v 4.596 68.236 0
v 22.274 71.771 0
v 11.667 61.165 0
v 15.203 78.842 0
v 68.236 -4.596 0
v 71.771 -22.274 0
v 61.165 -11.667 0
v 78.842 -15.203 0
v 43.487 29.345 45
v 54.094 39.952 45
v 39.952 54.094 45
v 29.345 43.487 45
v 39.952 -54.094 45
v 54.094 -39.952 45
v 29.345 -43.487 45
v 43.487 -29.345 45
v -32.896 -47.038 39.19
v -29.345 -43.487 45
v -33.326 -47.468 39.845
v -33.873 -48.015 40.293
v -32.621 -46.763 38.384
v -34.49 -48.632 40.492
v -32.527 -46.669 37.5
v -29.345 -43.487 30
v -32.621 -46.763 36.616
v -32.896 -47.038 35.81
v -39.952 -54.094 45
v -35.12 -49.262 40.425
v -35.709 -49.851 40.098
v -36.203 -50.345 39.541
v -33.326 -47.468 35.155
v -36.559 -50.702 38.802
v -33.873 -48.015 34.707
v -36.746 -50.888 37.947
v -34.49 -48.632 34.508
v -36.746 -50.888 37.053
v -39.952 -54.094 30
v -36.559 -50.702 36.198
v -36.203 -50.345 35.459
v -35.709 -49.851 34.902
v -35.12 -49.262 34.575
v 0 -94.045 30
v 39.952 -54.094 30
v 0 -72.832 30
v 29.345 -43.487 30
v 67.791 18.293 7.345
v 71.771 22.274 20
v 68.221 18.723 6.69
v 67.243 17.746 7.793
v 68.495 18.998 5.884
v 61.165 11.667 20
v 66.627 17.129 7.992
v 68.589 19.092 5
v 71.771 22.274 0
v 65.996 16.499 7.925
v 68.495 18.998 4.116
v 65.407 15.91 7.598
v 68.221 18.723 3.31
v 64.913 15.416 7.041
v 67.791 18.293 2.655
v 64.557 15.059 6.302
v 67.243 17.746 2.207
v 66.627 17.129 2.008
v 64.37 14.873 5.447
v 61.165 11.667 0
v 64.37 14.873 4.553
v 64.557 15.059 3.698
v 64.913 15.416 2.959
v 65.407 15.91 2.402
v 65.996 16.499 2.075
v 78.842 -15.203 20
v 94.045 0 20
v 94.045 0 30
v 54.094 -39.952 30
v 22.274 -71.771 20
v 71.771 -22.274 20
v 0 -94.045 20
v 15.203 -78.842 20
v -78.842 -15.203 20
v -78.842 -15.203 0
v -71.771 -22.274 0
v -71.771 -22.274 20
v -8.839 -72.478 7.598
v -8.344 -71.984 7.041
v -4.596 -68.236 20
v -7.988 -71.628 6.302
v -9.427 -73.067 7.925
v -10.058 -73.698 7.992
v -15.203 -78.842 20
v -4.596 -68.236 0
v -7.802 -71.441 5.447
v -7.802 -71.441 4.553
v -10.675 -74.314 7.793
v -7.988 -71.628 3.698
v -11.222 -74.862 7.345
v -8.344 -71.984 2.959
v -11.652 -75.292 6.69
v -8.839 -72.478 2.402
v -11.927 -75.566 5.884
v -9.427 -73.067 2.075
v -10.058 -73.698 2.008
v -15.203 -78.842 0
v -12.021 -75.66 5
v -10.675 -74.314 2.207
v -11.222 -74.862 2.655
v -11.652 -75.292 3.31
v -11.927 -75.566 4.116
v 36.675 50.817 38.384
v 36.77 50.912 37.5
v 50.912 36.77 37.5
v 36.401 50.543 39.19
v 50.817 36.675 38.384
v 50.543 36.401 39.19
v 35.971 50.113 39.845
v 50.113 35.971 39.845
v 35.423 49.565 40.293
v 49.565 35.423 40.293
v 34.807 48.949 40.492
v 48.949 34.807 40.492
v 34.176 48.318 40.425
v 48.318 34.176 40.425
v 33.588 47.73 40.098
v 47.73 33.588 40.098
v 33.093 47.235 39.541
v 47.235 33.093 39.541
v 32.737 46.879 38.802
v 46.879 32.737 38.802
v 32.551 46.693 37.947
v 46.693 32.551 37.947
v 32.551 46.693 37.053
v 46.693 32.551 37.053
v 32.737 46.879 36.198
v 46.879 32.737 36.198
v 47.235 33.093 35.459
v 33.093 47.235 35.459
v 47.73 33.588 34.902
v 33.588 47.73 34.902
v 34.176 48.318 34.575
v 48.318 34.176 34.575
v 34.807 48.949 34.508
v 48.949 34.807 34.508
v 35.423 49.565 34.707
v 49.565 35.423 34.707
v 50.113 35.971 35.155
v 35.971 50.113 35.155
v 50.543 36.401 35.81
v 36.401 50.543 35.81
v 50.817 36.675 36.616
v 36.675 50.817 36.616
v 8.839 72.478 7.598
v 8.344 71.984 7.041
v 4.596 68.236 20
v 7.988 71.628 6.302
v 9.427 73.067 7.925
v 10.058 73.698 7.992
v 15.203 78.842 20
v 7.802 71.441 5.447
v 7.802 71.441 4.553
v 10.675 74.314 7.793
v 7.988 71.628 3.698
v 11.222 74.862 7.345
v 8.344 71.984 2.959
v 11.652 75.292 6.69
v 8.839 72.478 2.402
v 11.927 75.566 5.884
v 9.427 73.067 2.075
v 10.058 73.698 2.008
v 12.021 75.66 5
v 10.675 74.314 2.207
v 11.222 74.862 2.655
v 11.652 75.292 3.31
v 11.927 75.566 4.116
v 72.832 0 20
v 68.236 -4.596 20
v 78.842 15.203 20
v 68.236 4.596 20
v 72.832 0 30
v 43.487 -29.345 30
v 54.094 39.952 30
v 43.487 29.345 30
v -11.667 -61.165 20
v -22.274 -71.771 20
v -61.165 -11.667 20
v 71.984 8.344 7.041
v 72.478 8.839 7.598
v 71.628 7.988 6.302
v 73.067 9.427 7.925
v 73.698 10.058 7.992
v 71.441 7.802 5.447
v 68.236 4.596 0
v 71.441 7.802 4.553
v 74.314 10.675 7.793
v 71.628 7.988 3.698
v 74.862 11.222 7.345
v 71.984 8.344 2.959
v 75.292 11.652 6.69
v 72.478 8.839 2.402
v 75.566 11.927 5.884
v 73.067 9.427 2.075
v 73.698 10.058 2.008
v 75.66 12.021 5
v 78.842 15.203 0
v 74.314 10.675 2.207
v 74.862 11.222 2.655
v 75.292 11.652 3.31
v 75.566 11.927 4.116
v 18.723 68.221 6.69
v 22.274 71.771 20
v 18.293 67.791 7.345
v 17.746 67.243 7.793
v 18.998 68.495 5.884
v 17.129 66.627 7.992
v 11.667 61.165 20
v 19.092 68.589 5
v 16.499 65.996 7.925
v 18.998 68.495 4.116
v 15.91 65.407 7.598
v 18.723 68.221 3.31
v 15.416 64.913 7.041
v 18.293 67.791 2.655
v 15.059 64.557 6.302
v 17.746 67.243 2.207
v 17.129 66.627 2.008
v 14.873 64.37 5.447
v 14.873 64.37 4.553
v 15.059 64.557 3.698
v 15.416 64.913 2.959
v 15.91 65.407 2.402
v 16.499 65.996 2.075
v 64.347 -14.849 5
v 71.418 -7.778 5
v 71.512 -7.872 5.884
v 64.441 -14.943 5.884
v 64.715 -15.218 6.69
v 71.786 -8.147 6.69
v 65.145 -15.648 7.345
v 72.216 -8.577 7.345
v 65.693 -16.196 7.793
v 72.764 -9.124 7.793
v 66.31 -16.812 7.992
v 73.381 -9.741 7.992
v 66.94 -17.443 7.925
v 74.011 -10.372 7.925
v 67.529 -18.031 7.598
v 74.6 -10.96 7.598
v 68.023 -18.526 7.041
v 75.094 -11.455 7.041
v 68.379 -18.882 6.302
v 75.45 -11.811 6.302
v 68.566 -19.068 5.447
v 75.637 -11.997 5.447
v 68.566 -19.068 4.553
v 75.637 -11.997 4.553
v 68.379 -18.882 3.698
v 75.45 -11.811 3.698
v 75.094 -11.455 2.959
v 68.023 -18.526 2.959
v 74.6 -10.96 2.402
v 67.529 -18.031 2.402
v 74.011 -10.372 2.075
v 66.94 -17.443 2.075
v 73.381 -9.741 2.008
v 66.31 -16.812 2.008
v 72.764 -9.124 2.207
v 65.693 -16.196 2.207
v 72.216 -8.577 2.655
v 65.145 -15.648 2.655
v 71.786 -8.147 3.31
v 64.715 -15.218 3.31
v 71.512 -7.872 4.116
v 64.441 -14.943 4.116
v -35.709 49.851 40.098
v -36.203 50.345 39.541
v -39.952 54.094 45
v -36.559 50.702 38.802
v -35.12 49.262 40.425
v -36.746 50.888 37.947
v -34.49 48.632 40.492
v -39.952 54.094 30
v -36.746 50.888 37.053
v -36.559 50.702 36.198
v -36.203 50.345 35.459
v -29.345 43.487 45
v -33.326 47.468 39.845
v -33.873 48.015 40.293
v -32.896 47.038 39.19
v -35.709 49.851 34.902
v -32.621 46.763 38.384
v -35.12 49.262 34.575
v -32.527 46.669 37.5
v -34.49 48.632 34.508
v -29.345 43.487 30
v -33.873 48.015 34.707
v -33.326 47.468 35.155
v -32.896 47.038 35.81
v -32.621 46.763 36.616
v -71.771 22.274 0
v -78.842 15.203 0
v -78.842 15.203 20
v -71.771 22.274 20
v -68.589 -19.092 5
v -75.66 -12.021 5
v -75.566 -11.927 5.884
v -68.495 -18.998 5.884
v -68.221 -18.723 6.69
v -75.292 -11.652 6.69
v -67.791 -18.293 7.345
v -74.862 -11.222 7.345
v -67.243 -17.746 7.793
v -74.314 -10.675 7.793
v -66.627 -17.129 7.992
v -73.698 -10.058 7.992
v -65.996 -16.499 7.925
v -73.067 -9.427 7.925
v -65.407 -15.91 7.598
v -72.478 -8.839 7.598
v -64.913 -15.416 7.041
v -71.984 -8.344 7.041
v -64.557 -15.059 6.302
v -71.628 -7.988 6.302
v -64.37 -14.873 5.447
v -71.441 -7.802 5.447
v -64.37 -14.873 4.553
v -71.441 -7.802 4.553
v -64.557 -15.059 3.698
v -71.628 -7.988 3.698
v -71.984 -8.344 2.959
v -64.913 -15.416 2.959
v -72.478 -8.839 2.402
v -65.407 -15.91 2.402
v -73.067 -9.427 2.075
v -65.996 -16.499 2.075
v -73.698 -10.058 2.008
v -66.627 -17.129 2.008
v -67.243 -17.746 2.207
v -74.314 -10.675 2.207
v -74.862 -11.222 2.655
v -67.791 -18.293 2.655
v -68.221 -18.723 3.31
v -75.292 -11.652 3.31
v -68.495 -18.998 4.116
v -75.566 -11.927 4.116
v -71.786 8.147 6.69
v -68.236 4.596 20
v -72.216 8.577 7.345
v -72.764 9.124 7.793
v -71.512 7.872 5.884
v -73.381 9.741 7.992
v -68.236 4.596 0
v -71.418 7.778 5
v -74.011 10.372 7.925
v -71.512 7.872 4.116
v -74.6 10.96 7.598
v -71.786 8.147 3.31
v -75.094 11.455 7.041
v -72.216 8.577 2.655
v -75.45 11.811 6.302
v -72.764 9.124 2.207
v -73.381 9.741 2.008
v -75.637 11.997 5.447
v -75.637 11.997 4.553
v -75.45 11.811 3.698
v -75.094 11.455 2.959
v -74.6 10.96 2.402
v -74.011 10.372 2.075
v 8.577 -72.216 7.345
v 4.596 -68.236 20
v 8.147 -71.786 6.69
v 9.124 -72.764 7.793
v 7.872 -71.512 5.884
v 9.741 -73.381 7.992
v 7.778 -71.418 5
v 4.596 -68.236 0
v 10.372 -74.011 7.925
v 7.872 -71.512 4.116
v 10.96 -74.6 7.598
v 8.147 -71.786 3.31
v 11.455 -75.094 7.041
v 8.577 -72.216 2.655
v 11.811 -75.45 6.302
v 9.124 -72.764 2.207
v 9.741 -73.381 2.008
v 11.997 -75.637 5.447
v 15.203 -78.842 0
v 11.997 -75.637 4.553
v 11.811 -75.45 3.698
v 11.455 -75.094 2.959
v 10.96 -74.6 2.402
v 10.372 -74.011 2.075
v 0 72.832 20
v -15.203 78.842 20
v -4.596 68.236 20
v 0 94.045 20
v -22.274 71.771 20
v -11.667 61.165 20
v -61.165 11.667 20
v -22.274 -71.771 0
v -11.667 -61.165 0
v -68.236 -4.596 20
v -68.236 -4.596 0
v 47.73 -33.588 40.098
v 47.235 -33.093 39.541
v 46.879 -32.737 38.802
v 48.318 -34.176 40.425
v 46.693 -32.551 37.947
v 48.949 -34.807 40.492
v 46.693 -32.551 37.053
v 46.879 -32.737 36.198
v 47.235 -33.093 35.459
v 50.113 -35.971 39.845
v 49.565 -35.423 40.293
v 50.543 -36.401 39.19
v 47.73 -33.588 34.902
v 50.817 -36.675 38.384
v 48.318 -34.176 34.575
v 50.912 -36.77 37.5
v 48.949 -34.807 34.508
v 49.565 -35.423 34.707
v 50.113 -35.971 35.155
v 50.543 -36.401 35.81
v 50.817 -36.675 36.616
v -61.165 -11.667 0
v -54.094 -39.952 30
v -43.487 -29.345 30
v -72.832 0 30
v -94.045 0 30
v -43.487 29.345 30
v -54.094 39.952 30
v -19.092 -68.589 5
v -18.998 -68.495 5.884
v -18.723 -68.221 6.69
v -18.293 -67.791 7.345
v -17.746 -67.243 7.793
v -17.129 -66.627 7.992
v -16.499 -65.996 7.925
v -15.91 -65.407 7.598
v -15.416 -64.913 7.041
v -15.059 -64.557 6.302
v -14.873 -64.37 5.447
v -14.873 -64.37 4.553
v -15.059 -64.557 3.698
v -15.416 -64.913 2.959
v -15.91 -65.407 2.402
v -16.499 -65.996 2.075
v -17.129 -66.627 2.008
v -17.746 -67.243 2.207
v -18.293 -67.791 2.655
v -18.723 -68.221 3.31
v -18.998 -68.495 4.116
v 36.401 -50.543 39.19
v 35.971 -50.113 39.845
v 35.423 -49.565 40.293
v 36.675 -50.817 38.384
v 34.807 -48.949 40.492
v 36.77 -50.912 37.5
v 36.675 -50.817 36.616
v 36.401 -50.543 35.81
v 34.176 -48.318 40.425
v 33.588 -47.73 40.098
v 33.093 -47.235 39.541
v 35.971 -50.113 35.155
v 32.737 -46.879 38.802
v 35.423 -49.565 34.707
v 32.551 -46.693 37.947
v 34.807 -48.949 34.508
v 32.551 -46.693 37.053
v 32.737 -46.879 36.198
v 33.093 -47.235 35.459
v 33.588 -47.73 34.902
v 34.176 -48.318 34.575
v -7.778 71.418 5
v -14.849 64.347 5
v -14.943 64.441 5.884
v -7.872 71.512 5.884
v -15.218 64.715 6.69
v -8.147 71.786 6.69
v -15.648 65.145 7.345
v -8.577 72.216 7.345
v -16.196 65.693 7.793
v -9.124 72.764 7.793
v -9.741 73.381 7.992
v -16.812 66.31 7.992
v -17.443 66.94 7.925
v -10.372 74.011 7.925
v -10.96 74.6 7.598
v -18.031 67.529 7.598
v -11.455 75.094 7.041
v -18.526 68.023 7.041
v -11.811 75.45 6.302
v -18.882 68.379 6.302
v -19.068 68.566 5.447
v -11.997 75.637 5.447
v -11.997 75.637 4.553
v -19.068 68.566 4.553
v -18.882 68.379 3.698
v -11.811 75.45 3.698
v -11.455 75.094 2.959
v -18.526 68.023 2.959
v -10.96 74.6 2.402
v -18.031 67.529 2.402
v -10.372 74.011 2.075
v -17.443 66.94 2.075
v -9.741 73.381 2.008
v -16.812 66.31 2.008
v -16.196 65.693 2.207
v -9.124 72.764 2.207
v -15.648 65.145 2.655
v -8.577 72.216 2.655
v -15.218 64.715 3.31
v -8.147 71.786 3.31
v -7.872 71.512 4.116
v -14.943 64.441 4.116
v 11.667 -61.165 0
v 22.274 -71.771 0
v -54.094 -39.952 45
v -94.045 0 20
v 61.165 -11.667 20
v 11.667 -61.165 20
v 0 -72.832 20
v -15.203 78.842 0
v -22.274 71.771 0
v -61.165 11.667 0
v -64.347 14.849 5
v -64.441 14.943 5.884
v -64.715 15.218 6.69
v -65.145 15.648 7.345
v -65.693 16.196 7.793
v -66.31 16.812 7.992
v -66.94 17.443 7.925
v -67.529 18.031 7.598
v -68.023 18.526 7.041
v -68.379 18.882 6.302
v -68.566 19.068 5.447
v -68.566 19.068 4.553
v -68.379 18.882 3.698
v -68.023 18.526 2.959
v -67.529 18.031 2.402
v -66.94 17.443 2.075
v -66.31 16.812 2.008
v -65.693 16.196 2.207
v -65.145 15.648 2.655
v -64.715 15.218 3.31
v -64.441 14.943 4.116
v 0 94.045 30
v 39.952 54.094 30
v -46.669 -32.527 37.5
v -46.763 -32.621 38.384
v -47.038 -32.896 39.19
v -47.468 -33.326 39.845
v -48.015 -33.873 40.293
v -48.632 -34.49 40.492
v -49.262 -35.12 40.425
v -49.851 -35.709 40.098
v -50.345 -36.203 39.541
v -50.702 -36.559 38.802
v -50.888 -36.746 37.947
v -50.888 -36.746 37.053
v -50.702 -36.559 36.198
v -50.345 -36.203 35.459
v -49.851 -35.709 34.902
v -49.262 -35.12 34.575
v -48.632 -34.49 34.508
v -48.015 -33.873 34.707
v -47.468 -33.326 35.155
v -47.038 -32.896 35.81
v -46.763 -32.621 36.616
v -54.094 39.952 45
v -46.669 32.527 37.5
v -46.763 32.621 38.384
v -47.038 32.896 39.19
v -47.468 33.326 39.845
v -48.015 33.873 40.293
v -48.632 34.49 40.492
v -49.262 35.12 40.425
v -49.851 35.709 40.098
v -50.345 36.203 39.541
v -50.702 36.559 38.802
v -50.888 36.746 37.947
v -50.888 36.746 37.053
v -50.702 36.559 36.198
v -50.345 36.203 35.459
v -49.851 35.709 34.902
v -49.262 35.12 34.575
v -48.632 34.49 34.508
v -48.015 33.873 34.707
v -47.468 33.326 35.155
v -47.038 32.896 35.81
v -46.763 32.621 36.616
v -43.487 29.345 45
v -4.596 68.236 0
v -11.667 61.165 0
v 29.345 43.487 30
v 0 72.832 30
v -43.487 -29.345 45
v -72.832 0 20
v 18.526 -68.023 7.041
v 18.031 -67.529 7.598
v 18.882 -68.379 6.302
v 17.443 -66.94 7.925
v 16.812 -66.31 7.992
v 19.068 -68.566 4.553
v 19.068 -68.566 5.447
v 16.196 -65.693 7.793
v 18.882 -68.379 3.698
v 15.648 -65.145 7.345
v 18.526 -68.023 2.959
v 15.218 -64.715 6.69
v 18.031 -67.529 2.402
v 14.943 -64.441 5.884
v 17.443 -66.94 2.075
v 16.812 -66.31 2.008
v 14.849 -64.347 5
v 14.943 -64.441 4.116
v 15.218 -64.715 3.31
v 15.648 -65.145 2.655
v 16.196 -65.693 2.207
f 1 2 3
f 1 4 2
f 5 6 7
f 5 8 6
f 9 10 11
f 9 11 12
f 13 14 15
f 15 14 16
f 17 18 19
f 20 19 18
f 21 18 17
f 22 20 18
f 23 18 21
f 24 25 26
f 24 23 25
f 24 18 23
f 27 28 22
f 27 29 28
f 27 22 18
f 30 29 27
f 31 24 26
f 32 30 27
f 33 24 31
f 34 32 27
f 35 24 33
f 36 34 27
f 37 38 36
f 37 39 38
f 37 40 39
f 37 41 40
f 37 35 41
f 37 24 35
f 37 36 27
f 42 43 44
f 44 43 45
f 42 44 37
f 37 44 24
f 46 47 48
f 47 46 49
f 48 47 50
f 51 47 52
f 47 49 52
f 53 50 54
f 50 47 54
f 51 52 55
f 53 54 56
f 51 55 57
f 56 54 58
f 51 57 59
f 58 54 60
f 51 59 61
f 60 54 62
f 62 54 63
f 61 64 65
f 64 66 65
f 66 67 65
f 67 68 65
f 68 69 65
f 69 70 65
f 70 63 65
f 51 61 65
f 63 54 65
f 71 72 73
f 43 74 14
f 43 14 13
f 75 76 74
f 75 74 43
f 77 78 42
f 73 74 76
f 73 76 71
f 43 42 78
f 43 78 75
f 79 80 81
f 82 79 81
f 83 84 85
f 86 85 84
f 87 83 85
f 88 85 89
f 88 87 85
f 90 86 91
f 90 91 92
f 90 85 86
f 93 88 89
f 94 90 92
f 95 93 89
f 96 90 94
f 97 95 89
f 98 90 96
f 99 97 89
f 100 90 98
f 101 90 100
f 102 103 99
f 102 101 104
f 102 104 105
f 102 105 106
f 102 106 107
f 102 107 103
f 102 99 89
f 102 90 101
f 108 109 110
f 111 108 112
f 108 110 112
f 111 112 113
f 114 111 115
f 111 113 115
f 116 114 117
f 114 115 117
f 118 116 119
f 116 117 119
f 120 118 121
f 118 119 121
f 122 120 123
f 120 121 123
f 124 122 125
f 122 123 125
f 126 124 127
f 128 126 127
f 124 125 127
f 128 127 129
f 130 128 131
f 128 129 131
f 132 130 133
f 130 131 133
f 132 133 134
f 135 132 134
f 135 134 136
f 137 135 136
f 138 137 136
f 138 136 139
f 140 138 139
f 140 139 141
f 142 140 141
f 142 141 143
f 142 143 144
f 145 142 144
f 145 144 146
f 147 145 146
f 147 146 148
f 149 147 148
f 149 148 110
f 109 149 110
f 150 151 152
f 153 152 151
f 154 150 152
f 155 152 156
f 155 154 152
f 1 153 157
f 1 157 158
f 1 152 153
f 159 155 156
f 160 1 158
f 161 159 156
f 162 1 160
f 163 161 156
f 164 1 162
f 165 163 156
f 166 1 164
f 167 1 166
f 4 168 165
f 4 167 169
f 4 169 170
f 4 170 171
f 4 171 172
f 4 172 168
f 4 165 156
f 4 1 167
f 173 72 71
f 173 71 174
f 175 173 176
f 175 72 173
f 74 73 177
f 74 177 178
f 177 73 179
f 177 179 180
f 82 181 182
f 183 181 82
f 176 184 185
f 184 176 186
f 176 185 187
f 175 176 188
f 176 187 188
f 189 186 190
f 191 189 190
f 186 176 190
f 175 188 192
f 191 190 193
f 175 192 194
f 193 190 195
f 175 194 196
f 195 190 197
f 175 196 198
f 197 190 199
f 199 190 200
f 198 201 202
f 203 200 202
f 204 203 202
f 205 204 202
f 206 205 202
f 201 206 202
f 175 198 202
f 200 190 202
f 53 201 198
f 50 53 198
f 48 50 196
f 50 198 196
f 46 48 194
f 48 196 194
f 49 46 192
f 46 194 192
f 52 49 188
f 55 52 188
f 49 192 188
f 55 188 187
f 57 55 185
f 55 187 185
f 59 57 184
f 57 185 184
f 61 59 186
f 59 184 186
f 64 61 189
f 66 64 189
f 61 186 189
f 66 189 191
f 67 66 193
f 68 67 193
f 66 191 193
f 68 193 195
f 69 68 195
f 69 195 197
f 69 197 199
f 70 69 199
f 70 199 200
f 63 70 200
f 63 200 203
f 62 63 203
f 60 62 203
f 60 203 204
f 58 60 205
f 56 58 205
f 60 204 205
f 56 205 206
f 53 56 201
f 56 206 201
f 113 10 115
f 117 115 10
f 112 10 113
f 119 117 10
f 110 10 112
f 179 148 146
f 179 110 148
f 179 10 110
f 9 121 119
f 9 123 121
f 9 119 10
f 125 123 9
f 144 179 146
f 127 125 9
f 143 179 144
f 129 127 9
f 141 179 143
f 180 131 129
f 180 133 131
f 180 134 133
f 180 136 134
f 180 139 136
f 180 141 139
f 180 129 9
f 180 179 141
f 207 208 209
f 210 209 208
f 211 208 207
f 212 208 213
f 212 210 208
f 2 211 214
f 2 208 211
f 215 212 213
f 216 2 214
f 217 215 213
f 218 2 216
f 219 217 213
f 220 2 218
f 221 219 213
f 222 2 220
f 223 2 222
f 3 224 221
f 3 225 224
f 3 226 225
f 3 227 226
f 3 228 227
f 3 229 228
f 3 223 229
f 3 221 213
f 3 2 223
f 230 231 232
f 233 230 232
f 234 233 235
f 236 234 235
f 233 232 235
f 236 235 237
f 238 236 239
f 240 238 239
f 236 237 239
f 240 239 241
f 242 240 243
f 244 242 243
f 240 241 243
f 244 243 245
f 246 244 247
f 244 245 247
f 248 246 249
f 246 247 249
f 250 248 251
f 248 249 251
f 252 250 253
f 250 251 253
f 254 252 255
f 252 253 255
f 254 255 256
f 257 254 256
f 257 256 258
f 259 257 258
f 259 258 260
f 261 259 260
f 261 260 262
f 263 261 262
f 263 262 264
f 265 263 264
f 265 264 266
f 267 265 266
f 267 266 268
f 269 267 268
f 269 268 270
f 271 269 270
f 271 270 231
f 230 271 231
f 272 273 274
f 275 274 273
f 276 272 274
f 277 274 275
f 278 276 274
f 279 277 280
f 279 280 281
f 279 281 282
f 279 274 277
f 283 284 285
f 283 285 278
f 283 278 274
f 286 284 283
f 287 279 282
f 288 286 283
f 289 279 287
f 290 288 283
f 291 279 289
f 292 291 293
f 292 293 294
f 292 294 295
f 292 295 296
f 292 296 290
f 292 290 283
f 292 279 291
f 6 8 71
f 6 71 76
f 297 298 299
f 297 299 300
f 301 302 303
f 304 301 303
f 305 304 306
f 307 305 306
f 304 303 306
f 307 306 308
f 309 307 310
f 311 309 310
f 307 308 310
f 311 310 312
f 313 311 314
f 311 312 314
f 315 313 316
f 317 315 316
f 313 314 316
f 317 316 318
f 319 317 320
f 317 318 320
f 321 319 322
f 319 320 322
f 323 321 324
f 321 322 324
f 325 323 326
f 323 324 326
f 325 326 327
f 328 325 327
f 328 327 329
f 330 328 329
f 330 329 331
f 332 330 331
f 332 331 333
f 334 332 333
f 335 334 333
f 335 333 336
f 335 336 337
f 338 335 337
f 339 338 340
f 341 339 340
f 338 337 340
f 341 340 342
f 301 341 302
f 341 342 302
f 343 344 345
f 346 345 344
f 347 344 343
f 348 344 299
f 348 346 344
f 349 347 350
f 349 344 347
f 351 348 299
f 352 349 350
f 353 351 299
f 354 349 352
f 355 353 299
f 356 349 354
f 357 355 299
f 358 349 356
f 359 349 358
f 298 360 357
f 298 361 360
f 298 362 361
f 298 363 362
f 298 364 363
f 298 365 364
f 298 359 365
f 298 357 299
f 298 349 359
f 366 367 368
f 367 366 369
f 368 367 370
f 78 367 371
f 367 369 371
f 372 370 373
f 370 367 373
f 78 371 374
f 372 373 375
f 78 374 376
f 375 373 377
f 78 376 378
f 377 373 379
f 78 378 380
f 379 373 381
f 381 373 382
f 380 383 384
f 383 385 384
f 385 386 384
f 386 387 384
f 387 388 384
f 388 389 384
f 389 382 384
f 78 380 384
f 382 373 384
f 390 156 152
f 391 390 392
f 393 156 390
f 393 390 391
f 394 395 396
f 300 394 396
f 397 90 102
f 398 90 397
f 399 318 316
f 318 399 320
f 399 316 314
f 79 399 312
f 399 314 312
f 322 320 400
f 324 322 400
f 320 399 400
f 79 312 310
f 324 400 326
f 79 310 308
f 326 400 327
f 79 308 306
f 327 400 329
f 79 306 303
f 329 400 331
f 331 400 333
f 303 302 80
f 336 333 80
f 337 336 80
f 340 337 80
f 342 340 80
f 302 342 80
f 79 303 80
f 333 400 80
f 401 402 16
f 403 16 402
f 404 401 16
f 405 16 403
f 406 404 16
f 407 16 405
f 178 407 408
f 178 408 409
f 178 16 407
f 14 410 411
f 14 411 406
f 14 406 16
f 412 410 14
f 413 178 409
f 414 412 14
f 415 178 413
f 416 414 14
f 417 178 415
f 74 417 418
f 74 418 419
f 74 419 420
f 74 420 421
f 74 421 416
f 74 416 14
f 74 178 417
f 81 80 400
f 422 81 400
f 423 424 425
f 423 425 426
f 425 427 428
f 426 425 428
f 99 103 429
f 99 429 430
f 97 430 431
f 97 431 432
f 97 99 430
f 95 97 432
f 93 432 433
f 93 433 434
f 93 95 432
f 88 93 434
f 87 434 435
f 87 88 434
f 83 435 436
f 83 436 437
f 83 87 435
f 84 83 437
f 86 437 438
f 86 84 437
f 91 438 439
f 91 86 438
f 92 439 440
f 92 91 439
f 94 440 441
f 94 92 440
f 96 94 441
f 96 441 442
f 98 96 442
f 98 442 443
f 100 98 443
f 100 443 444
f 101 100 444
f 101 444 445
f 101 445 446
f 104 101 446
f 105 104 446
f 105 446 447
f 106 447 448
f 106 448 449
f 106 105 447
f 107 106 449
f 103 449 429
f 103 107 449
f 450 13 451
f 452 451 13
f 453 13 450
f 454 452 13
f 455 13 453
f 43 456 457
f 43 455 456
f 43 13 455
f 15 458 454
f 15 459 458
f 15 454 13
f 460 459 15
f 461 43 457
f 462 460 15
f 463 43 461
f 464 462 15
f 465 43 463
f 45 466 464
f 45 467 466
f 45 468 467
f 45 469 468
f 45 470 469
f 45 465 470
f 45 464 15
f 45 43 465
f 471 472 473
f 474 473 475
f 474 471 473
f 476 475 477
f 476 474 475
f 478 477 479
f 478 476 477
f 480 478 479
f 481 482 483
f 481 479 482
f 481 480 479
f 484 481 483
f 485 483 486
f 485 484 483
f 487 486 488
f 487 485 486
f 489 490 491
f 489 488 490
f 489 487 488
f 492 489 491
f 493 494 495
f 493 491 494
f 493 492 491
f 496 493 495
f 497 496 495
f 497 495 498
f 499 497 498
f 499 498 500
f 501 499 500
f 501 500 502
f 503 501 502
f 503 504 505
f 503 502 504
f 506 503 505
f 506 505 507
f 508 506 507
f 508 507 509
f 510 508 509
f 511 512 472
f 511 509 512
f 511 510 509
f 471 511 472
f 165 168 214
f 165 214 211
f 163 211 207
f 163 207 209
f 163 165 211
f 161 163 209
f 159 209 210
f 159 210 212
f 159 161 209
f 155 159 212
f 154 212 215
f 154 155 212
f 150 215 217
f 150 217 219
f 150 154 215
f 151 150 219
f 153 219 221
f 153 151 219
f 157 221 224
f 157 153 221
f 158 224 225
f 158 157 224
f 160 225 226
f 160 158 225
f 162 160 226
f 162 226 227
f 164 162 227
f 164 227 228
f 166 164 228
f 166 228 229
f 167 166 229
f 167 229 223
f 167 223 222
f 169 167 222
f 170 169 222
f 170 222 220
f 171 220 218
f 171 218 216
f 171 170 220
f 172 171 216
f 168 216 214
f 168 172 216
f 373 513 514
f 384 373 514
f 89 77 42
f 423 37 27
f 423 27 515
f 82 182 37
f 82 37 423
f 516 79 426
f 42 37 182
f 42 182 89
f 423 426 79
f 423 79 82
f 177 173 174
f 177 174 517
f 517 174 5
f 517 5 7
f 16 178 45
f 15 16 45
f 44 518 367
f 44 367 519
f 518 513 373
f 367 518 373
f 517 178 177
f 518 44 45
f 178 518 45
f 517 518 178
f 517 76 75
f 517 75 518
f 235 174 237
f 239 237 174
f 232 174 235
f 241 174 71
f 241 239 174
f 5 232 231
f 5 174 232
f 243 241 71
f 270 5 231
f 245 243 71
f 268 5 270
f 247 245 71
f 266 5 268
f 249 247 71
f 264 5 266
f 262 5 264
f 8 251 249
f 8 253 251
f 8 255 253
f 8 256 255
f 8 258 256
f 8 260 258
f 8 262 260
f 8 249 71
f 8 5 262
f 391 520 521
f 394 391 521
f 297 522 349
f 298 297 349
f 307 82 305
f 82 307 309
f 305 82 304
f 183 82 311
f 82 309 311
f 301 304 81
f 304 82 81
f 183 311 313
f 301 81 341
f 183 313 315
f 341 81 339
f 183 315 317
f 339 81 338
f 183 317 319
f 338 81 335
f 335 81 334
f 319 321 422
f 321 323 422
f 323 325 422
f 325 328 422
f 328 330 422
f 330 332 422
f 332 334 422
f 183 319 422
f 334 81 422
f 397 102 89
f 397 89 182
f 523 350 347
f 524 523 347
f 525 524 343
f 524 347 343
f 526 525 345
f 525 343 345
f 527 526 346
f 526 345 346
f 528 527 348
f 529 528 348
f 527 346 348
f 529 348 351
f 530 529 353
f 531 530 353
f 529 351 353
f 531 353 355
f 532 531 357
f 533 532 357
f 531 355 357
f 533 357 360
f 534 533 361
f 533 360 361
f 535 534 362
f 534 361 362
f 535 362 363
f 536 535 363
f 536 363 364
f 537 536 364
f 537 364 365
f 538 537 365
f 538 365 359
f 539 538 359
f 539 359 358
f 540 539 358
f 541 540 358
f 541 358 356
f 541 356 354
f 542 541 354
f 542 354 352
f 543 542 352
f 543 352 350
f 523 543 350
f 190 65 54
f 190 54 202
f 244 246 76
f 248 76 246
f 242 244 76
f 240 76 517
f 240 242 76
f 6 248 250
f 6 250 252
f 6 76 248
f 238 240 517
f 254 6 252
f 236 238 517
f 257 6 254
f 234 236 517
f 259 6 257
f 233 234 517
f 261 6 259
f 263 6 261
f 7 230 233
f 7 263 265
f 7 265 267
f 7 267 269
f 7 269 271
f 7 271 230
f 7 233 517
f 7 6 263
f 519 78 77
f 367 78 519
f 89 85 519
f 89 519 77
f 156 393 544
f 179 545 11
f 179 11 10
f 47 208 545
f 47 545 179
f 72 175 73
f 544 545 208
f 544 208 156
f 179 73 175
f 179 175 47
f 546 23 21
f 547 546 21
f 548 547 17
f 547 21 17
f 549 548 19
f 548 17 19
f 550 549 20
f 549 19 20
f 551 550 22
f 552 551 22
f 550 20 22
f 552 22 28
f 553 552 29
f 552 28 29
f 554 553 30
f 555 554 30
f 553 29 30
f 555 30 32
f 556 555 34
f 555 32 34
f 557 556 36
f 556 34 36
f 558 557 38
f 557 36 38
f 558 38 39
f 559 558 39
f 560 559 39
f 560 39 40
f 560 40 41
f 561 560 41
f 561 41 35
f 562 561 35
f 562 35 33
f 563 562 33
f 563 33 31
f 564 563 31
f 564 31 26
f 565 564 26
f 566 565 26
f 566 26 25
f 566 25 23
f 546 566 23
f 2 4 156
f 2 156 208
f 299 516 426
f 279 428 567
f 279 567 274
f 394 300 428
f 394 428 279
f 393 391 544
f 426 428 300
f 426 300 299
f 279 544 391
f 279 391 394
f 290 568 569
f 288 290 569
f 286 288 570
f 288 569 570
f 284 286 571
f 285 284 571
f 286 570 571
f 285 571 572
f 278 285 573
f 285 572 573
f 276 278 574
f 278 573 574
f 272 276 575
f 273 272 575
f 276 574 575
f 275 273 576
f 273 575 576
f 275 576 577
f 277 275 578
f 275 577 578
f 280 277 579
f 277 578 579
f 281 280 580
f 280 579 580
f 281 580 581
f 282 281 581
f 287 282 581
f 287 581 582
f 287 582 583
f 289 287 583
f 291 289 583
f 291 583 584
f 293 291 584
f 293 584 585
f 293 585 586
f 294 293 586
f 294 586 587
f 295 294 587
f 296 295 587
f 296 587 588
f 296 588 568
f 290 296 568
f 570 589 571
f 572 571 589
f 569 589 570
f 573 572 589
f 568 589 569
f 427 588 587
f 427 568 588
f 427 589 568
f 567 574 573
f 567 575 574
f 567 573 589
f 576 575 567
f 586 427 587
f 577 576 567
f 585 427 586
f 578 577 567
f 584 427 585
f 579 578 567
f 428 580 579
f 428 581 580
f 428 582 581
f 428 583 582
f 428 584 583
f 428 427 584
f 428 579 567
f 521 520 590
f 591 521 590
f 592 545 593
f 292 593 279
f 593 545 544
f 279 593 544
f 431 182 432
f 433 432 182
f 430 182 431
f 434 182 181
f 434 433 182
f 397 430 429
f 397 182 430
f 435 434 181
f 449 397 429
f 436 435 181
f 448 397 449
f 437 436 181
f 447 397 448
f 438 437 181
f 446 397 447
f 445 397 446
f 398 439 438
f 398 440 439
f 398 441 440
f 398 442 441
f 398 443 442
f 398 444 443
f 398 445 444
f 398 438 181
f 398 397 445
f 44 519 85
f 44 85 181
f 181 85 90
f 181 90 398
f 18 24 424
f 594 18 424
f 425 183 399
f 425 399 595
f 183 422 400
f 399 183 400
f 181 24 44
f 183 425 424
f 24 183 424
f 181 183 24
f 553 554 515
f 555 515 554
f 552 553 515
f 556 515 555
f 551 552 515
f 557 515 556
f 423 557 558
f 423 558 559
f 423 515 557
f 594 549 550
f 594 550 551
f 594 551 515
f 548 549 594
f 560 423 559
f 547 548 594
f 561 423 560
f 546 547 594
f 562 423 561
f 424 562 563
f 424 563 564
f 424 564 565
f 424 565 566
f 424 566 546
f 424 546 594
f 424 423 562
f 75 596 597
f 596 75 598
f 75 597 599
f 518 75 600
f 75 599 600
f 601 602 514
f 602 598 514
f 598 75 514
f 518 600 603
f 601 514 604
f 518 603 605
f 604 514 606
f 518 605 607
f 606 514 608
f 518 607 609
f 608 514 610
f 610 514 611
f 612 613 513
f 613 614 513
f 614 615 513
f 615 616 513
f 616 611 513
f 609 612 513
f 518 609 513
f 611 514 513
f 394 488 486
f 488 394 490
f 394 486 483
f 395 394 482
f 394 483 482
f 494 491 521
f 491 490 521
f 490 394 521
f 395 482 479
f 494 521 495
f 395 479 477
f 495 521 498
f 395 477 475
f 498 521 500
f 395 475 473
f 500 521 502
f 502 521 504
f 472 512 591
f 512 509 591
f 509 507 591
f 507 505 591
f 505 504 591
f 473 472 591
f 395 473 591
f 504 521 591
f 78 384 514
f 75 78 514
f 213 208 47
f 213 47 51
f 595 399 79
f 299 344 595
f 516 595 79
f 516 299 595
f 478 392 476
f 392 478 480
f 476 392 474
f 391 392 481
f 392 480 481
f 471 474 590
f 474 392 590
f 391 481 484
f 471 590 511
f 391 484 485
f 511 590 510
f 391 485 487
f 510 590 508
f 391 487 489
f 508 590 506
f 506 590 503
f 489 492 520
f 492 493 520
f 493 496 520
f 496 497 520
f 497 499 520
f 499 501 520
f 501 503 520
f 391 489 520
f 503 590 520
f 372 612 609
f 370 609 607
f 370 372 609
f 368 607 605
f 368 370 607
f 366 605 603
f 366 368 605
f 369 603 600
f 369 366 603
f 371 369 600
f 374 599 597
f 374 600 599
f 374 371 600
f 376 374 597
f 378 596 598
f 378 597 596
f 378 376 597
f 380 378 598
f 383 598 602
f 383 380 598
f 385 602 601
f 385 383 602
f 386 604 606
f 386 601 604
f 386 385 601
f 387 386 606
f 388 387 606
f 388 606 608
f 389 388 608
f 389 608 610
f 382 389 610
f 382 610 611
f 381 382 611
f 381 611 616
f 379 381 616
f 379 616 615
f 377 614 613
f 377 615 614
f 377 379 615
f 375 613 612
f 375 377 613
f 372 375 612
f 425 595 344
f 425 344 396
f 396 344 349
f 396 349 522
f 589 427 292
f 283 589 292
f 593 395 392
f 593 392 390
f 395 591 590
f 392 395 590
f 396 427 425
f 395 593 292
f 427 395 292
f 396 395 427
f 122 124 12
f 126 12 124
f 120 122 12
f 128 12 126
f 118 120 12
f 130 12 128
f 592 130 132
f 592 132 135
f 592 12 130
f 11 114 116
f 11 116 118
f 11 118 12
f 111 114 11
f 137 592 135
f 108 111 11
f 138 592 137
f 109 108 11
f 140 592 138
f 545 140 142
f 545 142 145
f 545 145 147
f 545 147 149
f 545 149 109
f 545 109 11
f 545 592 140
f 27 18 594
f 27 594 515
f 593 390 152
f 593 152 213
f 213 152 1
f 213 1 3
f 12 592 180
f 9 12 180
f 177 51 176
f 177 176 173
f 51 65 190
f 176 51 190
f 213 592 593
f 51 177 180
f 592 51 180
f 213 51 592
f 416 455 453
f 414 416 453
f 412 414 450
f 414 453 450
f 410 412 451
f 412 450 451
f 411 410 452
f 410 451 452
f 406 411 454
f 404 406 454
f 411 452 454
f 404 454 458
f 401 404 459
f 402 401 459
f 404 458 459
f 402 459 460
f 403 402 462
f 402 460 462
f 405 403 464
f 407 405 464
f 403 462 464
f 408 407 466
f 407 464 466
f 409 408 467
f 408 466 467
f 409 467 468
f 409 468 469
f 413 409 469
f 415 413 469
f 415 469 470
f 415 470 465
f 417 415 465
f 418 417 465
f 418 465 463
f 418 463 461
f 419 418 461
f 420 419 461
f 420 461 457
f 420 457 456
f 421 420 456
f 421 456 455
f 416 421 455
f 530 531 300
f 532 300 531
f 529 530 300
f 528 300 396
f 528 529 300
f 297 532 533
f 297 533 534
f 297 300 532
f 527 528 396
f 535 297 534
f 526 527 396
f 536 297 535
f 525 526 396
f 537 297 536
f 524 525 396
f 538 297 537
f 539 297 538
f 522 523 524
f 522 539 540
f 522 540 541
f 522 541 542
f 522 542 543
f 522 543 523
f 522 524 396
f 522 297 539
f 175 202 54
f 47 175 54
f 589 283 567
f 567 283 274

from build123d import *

# Parameters (mm, degrees)
SALIENTE_EXTRUIR1_DEPTH   = 20
SALIENTE_EXTRUIR1_2_DEPTH = 20
SALIENTE_EXTRUIR1_3_DEPTH = 20
SALIENTE_EXTRUIR1_4_DEPTH = 20
SALIENTE_EXTRUIR1_5_DEPTH = 20
SALIENTE_EXTRUIR1_6_DEPTH = 20
SALIENTE_EXTRUIR1_7_DEPTH = 20
SALIENTE_EXTRUIR1_8_DEPTH = 20
SALIENTE_EXTRUIR2_DEPTH   = 10
CROQUIS7_R                = 3
CORTAR_EXTRUIR2_DEPTH     = 80
CROQUIS8_R                = 3
CORTAR_EXTRUIR3_DEPTH     = 10
SIMETR_A4_COPY_1_SKETCH_R = 3
SIMETR_A4_COPY_1_DEPTH    = 80
SIMETR_A4_COPY_2_SKETCH_R = 3
SIMETR_A4_COPY_2_DEPTH    = 10
SALIENTE_EXTRUIR3_DEPTH   = 15
CROQUIS11_R               = 3
CORTAR_EXTRUIR4_DEPTH     = 150.913308282
CROQUIS13_R               = 3
CORTAR_EXTRUIR5_DEPTH     = 150.913308282


with BuildPart() as part:
    # Croquis1 → Saliente-Extruir1 (new body)
    with BuildSketch(Plane.XY):
        Polygon((-71.77133829, 22.273863607), (-61.164736573, 11.66726189), (-68.235804385, 4.596194078), (-78.842406102, 15.202795796), align=None)
    extrude(amount=SALIENTE_EXTRUIR1_DEPTH)



with BuildPart() as body_2:
    # Croquis1 → Saliente-Extruir1 2 (new body)
    with BuildSketch(Plane.XY):
        Polygon((-11.66726189, 61.164736573), (-4.596194078, 68.235804385), (-15.202795796, 78.842406102), (-22.273863607, 71.77133829), align=None)
    extrude(amount=SALIENTE_EXTRUIR1_2_DEPTH)


with BuildPart() as body_3:
    # Croquis1 → Saliente-Extruir1 3 (new body)
    with BuildSketch(Plane.XY):
        Polygon((22.273863607, 71.77133829), (11.66726189, 61.164736573), (4.596194078, 68.235804385), (15.202795796, 78.842406102), align=None)
    extrude(amount=SALIENTE_EXTRUIR1_3_DEPTH)


with BuildPart() as body_4:
    # Croquis1 → Saliente-Extruir1 4 (new body)
    with BuildSketch(Plane.XY):
        Polygon((61.164736573, 11.66726189), (68.235804385, 4.596194078), (78.842406102, 15.202795796), (71.77133829, 22.273863607), align=None)
    extrude(amount=SALIENTE_EXTRUIR1_4_DEPTH)


with BuildPart() as body_5:
    # Croquis1 → Saliente-Extruir1 5 (new body)
    with BuildSketch(Plane.XY):
        Polygon((71.77133829, -22.273863607), (61.164736573, -11.66726189), (68.235804385, -4.596194078), (78.842406102, -15.202795796), align=None)
    extrude(amount=SALIENTE_EXTRUIR1_5_DEPTH)


with BuildPart() as body_6:
    # Croquis1 → Saliente-Extruir1 6 (new body)
    with BuildSketch(Plane.XY):
        Polygon((11.66726189, -61.164736573), (4.596194078, -68.235804385), (15.202795796, -78.842406102), (22.273863607, -71.77133829), align=None)
    extrude(amount=SALIENTE_EXTRUIR1_6_DEPTH)


with BuildPart() as body_7:
    # Croquis1 → Saliente-Extruir1 7 (new body)
    with BuildSketch(Plane.XY):
        Polygon((-22.273863607, -71.77133829), (-11.66726189, -61.164736573), (-4.596194078, -68.235804385), (-15.202795796, -78.842406102), align=None)
    extrude(amount=SALIENTE_EXTRUIR1_7_DEPTH)


with BuildPart() as body_8:
    # Croquis1 → Saliente-Extruir1 8 (new body)
    with BuildSketch(Plane.XY):
        Polygon((-61.164736573, -11.66726189), (-68.235804385, -4.596194078), (-78.842406102, -15.202795796), (-71.77133829, -22.273863607), align=None)
    extrude(amount=SALIENTE_EXTRUIR1_8_DEPTH)


with BuildPart() as part_1:
    add(part.part)

    add(body_2.part)  # Saliente-Extruir2 merges body 2

    add(body_3.part)  # Saliente-Extruir2 merges body 3

    add(body_4.part)  # Saliente-Extruir2 merges body 4

    add(body_5.part)  # Saliente-Extruir2 merges body 5

    add(body_6.part)  # Saliente-Extruir2 merges body 6

    add(body_7.part)  # Saliente-Extruir2 merges body 7

    add(body_8.part)  # Saliente-Extruir2 merges body 8
    # Croquis2 → Saliente-Extruir2 (add)
    with BuildSketch(Plane.XY.offset(20)):
        Polygon((0, 94.045201898), (94.045201898, 0), (0, -94.045201898), (-94.045201898, 0), align=None)
        Polygon((0, 72.831998462), (72.831998462, 0), (0, -72.831998462), (-72.831998462, 0), align=None, mode=Mode.SUBTRACT)
    extrude(amount=SALIENTE_EXTRUIR2_DEPTH)

    # Croquis7 → Cortar-Extruir2 (cut)
    with BuildSketch(Plane(origin=(31.819805153, 31.819805153, 0), x_dir=(0, 0, -1), z_dir=(0.7071067811865476, 0.7071067811865476, 0))):
        with Locations(Location((-5, -59, 0), (0, 0, 90))):
            Circle(CROQUIS7_R)
    cortar_extruir2 = extrude(amount=-CORTAR_EXTRUIR2_DEPTH, mode=Mode.SUBTRACT)

    # Croquis8 → Cortar-Extruir3 (cut)
    with BuildSketch(Plane(origin=(31.819805153, -31.819805153, 0), x_dir=(0, 0, -1), z_dir=(0.7071067811865481, -0.707106781186547, 0))):
        with Locations(Location((-5, 59, 0), (0, 0, 90))):
            Circle(CROQUIS8_R)
    cortar_extruir3 = extrude(amount=-CORTAR_EXTRUIR3_DEPTH, mode=Mode.SUBTRACT)

    # Simetría3: Cortar-Extruir2, Cortar-Extruir3 across plane
    add(cortar_extruir2.mirror(Plane(origin=(0, 0, 0), x_dir=(0, 0, 1), z_dir=(0.7071067811865481, -0.707106781186547, 0))), mode=Mode.SUBTRACT)
    add(cortar_extruir3.mirror(Plane(origin=(0, 0, 0), x_dir=(0, 0, 1), z_dir=(0.7071067811865481, -0.707106781186547, 0))), mode=Mode.SUBTRACT)

    # Simetría4: Cortar-Extruir2, Cortar-Extruir3 across plane
    add(cortar_extruir2.mirror(Plane(origin=(0, 0, 0), x_dir=(0, 0, 1), z_dir=(-0.7071067811865477, -0.7071067811865475, 0))), mode=Mode.SUBTRACT)
    add(cortar_extruir3.mirror(Plane(origin=(0, 0, 0), x_dir=(0, 0, 1), z_dir=(-0.7071067811865477, -0.7071067811865475, 0))), mode=Mode.SUBTRACT)

    # Simetría4 copy 1 sketch → Simetría4 copy 1 (cut)
    with BuildSketch(Plane(origin=(-31.819805153, -31.819805153, 0), x_dir=(0, 0, -1), z_dir=(-0.7071067811865492, -0.7071067811865465, 0))):
        with Locations(Location((-5, -59, 0), (0, 0, 90))):
            Circle(SIMETR_A4_COPY_1_SKETCH_R)
    extrude(amount=-SIMETR_A4_COPY_1_DEPTH, mode=Mode.SUBTRACT)

    # Simetría4 copy 2 sketch → Simetría4 copy 2 (cut)
    with BuildSketch(Plane(origin=(-31.819805153, 31.819805153, 0), x_dir=(0, 0, -1), z_dir=(-0.7071067811865471, 0.7071067811865488, 0))):
        with Locations(Location((-5, 59, 0), (0, 0, 90))):
            Circle(SIMETR_A4_COPY_2_SKETCH_R)
    extrude(amount=-SIMETR_A4_COPY_2_DEPTH, mode=Mode.SUBTRACT)

    # Croquis10 → Saliente-Extruir3 (add)
    with BuildSketch(Plane.XY.offset(30)):
        Polygon((29.344931419, 43.487067043), (39.951533137, 54.093668761), (54.093668761, 39.951533137), (43.487067043, 29.344931419), align=None)
        Polygon((43.487067043, -29.344931419), (54.093668761, -39.951533137), (39.951533137, -54.093668761), (29.344931419, -43.487067043), align=None)
        Polygon((-29.344931419, -43.487067043), (-39.951533137, -54.093668761), (-54.093668761, -39.951533137), (-43.487067043, -29.344931419), align=None)
        Polygon((-43.487067043, 29.344931419), (-54.093668761, 39.951533137), (-39.951533137, 54.093668761), (-29.344931419, 43.487067043), align=None)
    extrude(amount=SALIENTE_EXTRUIR3_DEPTH)

    # Croquis11 → Cortar-Extruir4 (cut, through all)
    with BuildSketch(Plane(origin=(7.071067812, -7.071067812, 0), x_dir=(0, 0, -1), z_dir=(0.7071067811865481, -0.707106781186547, 0))):
        with Locations(Location((-37.5, 59, 0), (0, 0, 90))):
            Circle(CROQUIS11_R)
        with Locations(Location((-37.5, -59, 0), (0, 0, 90))):
            Circle(CROQUIS11_R)
    extrude(amount=-CORTAR_EXTRUIR4_DEPTH, mode=Mode.SUBTRACT)

    # Croquis13 → Cortar-Extruir5 (cut, through all)
    with BuildSketch(Plane(origin=(-7.071067812, -7.071067812, 0), x_dir=(0, 0, 1), z_dir=(-0.707106781186549, -0.707106781186546, 0))):
        with Locations(Location((37.5, -59, 0), (0, 0, 270))):
            Circle(CROQUIS13_R)
        with Locations(Location((37.5, 59, 0), (0, 0, 270))):
            Circle(CROQUIS13_R)
    extrude(amount=-CORTAR_EXTRUIR5_DEPTH, mode=Mode.SUBTRACT)


solid = part_1.part
